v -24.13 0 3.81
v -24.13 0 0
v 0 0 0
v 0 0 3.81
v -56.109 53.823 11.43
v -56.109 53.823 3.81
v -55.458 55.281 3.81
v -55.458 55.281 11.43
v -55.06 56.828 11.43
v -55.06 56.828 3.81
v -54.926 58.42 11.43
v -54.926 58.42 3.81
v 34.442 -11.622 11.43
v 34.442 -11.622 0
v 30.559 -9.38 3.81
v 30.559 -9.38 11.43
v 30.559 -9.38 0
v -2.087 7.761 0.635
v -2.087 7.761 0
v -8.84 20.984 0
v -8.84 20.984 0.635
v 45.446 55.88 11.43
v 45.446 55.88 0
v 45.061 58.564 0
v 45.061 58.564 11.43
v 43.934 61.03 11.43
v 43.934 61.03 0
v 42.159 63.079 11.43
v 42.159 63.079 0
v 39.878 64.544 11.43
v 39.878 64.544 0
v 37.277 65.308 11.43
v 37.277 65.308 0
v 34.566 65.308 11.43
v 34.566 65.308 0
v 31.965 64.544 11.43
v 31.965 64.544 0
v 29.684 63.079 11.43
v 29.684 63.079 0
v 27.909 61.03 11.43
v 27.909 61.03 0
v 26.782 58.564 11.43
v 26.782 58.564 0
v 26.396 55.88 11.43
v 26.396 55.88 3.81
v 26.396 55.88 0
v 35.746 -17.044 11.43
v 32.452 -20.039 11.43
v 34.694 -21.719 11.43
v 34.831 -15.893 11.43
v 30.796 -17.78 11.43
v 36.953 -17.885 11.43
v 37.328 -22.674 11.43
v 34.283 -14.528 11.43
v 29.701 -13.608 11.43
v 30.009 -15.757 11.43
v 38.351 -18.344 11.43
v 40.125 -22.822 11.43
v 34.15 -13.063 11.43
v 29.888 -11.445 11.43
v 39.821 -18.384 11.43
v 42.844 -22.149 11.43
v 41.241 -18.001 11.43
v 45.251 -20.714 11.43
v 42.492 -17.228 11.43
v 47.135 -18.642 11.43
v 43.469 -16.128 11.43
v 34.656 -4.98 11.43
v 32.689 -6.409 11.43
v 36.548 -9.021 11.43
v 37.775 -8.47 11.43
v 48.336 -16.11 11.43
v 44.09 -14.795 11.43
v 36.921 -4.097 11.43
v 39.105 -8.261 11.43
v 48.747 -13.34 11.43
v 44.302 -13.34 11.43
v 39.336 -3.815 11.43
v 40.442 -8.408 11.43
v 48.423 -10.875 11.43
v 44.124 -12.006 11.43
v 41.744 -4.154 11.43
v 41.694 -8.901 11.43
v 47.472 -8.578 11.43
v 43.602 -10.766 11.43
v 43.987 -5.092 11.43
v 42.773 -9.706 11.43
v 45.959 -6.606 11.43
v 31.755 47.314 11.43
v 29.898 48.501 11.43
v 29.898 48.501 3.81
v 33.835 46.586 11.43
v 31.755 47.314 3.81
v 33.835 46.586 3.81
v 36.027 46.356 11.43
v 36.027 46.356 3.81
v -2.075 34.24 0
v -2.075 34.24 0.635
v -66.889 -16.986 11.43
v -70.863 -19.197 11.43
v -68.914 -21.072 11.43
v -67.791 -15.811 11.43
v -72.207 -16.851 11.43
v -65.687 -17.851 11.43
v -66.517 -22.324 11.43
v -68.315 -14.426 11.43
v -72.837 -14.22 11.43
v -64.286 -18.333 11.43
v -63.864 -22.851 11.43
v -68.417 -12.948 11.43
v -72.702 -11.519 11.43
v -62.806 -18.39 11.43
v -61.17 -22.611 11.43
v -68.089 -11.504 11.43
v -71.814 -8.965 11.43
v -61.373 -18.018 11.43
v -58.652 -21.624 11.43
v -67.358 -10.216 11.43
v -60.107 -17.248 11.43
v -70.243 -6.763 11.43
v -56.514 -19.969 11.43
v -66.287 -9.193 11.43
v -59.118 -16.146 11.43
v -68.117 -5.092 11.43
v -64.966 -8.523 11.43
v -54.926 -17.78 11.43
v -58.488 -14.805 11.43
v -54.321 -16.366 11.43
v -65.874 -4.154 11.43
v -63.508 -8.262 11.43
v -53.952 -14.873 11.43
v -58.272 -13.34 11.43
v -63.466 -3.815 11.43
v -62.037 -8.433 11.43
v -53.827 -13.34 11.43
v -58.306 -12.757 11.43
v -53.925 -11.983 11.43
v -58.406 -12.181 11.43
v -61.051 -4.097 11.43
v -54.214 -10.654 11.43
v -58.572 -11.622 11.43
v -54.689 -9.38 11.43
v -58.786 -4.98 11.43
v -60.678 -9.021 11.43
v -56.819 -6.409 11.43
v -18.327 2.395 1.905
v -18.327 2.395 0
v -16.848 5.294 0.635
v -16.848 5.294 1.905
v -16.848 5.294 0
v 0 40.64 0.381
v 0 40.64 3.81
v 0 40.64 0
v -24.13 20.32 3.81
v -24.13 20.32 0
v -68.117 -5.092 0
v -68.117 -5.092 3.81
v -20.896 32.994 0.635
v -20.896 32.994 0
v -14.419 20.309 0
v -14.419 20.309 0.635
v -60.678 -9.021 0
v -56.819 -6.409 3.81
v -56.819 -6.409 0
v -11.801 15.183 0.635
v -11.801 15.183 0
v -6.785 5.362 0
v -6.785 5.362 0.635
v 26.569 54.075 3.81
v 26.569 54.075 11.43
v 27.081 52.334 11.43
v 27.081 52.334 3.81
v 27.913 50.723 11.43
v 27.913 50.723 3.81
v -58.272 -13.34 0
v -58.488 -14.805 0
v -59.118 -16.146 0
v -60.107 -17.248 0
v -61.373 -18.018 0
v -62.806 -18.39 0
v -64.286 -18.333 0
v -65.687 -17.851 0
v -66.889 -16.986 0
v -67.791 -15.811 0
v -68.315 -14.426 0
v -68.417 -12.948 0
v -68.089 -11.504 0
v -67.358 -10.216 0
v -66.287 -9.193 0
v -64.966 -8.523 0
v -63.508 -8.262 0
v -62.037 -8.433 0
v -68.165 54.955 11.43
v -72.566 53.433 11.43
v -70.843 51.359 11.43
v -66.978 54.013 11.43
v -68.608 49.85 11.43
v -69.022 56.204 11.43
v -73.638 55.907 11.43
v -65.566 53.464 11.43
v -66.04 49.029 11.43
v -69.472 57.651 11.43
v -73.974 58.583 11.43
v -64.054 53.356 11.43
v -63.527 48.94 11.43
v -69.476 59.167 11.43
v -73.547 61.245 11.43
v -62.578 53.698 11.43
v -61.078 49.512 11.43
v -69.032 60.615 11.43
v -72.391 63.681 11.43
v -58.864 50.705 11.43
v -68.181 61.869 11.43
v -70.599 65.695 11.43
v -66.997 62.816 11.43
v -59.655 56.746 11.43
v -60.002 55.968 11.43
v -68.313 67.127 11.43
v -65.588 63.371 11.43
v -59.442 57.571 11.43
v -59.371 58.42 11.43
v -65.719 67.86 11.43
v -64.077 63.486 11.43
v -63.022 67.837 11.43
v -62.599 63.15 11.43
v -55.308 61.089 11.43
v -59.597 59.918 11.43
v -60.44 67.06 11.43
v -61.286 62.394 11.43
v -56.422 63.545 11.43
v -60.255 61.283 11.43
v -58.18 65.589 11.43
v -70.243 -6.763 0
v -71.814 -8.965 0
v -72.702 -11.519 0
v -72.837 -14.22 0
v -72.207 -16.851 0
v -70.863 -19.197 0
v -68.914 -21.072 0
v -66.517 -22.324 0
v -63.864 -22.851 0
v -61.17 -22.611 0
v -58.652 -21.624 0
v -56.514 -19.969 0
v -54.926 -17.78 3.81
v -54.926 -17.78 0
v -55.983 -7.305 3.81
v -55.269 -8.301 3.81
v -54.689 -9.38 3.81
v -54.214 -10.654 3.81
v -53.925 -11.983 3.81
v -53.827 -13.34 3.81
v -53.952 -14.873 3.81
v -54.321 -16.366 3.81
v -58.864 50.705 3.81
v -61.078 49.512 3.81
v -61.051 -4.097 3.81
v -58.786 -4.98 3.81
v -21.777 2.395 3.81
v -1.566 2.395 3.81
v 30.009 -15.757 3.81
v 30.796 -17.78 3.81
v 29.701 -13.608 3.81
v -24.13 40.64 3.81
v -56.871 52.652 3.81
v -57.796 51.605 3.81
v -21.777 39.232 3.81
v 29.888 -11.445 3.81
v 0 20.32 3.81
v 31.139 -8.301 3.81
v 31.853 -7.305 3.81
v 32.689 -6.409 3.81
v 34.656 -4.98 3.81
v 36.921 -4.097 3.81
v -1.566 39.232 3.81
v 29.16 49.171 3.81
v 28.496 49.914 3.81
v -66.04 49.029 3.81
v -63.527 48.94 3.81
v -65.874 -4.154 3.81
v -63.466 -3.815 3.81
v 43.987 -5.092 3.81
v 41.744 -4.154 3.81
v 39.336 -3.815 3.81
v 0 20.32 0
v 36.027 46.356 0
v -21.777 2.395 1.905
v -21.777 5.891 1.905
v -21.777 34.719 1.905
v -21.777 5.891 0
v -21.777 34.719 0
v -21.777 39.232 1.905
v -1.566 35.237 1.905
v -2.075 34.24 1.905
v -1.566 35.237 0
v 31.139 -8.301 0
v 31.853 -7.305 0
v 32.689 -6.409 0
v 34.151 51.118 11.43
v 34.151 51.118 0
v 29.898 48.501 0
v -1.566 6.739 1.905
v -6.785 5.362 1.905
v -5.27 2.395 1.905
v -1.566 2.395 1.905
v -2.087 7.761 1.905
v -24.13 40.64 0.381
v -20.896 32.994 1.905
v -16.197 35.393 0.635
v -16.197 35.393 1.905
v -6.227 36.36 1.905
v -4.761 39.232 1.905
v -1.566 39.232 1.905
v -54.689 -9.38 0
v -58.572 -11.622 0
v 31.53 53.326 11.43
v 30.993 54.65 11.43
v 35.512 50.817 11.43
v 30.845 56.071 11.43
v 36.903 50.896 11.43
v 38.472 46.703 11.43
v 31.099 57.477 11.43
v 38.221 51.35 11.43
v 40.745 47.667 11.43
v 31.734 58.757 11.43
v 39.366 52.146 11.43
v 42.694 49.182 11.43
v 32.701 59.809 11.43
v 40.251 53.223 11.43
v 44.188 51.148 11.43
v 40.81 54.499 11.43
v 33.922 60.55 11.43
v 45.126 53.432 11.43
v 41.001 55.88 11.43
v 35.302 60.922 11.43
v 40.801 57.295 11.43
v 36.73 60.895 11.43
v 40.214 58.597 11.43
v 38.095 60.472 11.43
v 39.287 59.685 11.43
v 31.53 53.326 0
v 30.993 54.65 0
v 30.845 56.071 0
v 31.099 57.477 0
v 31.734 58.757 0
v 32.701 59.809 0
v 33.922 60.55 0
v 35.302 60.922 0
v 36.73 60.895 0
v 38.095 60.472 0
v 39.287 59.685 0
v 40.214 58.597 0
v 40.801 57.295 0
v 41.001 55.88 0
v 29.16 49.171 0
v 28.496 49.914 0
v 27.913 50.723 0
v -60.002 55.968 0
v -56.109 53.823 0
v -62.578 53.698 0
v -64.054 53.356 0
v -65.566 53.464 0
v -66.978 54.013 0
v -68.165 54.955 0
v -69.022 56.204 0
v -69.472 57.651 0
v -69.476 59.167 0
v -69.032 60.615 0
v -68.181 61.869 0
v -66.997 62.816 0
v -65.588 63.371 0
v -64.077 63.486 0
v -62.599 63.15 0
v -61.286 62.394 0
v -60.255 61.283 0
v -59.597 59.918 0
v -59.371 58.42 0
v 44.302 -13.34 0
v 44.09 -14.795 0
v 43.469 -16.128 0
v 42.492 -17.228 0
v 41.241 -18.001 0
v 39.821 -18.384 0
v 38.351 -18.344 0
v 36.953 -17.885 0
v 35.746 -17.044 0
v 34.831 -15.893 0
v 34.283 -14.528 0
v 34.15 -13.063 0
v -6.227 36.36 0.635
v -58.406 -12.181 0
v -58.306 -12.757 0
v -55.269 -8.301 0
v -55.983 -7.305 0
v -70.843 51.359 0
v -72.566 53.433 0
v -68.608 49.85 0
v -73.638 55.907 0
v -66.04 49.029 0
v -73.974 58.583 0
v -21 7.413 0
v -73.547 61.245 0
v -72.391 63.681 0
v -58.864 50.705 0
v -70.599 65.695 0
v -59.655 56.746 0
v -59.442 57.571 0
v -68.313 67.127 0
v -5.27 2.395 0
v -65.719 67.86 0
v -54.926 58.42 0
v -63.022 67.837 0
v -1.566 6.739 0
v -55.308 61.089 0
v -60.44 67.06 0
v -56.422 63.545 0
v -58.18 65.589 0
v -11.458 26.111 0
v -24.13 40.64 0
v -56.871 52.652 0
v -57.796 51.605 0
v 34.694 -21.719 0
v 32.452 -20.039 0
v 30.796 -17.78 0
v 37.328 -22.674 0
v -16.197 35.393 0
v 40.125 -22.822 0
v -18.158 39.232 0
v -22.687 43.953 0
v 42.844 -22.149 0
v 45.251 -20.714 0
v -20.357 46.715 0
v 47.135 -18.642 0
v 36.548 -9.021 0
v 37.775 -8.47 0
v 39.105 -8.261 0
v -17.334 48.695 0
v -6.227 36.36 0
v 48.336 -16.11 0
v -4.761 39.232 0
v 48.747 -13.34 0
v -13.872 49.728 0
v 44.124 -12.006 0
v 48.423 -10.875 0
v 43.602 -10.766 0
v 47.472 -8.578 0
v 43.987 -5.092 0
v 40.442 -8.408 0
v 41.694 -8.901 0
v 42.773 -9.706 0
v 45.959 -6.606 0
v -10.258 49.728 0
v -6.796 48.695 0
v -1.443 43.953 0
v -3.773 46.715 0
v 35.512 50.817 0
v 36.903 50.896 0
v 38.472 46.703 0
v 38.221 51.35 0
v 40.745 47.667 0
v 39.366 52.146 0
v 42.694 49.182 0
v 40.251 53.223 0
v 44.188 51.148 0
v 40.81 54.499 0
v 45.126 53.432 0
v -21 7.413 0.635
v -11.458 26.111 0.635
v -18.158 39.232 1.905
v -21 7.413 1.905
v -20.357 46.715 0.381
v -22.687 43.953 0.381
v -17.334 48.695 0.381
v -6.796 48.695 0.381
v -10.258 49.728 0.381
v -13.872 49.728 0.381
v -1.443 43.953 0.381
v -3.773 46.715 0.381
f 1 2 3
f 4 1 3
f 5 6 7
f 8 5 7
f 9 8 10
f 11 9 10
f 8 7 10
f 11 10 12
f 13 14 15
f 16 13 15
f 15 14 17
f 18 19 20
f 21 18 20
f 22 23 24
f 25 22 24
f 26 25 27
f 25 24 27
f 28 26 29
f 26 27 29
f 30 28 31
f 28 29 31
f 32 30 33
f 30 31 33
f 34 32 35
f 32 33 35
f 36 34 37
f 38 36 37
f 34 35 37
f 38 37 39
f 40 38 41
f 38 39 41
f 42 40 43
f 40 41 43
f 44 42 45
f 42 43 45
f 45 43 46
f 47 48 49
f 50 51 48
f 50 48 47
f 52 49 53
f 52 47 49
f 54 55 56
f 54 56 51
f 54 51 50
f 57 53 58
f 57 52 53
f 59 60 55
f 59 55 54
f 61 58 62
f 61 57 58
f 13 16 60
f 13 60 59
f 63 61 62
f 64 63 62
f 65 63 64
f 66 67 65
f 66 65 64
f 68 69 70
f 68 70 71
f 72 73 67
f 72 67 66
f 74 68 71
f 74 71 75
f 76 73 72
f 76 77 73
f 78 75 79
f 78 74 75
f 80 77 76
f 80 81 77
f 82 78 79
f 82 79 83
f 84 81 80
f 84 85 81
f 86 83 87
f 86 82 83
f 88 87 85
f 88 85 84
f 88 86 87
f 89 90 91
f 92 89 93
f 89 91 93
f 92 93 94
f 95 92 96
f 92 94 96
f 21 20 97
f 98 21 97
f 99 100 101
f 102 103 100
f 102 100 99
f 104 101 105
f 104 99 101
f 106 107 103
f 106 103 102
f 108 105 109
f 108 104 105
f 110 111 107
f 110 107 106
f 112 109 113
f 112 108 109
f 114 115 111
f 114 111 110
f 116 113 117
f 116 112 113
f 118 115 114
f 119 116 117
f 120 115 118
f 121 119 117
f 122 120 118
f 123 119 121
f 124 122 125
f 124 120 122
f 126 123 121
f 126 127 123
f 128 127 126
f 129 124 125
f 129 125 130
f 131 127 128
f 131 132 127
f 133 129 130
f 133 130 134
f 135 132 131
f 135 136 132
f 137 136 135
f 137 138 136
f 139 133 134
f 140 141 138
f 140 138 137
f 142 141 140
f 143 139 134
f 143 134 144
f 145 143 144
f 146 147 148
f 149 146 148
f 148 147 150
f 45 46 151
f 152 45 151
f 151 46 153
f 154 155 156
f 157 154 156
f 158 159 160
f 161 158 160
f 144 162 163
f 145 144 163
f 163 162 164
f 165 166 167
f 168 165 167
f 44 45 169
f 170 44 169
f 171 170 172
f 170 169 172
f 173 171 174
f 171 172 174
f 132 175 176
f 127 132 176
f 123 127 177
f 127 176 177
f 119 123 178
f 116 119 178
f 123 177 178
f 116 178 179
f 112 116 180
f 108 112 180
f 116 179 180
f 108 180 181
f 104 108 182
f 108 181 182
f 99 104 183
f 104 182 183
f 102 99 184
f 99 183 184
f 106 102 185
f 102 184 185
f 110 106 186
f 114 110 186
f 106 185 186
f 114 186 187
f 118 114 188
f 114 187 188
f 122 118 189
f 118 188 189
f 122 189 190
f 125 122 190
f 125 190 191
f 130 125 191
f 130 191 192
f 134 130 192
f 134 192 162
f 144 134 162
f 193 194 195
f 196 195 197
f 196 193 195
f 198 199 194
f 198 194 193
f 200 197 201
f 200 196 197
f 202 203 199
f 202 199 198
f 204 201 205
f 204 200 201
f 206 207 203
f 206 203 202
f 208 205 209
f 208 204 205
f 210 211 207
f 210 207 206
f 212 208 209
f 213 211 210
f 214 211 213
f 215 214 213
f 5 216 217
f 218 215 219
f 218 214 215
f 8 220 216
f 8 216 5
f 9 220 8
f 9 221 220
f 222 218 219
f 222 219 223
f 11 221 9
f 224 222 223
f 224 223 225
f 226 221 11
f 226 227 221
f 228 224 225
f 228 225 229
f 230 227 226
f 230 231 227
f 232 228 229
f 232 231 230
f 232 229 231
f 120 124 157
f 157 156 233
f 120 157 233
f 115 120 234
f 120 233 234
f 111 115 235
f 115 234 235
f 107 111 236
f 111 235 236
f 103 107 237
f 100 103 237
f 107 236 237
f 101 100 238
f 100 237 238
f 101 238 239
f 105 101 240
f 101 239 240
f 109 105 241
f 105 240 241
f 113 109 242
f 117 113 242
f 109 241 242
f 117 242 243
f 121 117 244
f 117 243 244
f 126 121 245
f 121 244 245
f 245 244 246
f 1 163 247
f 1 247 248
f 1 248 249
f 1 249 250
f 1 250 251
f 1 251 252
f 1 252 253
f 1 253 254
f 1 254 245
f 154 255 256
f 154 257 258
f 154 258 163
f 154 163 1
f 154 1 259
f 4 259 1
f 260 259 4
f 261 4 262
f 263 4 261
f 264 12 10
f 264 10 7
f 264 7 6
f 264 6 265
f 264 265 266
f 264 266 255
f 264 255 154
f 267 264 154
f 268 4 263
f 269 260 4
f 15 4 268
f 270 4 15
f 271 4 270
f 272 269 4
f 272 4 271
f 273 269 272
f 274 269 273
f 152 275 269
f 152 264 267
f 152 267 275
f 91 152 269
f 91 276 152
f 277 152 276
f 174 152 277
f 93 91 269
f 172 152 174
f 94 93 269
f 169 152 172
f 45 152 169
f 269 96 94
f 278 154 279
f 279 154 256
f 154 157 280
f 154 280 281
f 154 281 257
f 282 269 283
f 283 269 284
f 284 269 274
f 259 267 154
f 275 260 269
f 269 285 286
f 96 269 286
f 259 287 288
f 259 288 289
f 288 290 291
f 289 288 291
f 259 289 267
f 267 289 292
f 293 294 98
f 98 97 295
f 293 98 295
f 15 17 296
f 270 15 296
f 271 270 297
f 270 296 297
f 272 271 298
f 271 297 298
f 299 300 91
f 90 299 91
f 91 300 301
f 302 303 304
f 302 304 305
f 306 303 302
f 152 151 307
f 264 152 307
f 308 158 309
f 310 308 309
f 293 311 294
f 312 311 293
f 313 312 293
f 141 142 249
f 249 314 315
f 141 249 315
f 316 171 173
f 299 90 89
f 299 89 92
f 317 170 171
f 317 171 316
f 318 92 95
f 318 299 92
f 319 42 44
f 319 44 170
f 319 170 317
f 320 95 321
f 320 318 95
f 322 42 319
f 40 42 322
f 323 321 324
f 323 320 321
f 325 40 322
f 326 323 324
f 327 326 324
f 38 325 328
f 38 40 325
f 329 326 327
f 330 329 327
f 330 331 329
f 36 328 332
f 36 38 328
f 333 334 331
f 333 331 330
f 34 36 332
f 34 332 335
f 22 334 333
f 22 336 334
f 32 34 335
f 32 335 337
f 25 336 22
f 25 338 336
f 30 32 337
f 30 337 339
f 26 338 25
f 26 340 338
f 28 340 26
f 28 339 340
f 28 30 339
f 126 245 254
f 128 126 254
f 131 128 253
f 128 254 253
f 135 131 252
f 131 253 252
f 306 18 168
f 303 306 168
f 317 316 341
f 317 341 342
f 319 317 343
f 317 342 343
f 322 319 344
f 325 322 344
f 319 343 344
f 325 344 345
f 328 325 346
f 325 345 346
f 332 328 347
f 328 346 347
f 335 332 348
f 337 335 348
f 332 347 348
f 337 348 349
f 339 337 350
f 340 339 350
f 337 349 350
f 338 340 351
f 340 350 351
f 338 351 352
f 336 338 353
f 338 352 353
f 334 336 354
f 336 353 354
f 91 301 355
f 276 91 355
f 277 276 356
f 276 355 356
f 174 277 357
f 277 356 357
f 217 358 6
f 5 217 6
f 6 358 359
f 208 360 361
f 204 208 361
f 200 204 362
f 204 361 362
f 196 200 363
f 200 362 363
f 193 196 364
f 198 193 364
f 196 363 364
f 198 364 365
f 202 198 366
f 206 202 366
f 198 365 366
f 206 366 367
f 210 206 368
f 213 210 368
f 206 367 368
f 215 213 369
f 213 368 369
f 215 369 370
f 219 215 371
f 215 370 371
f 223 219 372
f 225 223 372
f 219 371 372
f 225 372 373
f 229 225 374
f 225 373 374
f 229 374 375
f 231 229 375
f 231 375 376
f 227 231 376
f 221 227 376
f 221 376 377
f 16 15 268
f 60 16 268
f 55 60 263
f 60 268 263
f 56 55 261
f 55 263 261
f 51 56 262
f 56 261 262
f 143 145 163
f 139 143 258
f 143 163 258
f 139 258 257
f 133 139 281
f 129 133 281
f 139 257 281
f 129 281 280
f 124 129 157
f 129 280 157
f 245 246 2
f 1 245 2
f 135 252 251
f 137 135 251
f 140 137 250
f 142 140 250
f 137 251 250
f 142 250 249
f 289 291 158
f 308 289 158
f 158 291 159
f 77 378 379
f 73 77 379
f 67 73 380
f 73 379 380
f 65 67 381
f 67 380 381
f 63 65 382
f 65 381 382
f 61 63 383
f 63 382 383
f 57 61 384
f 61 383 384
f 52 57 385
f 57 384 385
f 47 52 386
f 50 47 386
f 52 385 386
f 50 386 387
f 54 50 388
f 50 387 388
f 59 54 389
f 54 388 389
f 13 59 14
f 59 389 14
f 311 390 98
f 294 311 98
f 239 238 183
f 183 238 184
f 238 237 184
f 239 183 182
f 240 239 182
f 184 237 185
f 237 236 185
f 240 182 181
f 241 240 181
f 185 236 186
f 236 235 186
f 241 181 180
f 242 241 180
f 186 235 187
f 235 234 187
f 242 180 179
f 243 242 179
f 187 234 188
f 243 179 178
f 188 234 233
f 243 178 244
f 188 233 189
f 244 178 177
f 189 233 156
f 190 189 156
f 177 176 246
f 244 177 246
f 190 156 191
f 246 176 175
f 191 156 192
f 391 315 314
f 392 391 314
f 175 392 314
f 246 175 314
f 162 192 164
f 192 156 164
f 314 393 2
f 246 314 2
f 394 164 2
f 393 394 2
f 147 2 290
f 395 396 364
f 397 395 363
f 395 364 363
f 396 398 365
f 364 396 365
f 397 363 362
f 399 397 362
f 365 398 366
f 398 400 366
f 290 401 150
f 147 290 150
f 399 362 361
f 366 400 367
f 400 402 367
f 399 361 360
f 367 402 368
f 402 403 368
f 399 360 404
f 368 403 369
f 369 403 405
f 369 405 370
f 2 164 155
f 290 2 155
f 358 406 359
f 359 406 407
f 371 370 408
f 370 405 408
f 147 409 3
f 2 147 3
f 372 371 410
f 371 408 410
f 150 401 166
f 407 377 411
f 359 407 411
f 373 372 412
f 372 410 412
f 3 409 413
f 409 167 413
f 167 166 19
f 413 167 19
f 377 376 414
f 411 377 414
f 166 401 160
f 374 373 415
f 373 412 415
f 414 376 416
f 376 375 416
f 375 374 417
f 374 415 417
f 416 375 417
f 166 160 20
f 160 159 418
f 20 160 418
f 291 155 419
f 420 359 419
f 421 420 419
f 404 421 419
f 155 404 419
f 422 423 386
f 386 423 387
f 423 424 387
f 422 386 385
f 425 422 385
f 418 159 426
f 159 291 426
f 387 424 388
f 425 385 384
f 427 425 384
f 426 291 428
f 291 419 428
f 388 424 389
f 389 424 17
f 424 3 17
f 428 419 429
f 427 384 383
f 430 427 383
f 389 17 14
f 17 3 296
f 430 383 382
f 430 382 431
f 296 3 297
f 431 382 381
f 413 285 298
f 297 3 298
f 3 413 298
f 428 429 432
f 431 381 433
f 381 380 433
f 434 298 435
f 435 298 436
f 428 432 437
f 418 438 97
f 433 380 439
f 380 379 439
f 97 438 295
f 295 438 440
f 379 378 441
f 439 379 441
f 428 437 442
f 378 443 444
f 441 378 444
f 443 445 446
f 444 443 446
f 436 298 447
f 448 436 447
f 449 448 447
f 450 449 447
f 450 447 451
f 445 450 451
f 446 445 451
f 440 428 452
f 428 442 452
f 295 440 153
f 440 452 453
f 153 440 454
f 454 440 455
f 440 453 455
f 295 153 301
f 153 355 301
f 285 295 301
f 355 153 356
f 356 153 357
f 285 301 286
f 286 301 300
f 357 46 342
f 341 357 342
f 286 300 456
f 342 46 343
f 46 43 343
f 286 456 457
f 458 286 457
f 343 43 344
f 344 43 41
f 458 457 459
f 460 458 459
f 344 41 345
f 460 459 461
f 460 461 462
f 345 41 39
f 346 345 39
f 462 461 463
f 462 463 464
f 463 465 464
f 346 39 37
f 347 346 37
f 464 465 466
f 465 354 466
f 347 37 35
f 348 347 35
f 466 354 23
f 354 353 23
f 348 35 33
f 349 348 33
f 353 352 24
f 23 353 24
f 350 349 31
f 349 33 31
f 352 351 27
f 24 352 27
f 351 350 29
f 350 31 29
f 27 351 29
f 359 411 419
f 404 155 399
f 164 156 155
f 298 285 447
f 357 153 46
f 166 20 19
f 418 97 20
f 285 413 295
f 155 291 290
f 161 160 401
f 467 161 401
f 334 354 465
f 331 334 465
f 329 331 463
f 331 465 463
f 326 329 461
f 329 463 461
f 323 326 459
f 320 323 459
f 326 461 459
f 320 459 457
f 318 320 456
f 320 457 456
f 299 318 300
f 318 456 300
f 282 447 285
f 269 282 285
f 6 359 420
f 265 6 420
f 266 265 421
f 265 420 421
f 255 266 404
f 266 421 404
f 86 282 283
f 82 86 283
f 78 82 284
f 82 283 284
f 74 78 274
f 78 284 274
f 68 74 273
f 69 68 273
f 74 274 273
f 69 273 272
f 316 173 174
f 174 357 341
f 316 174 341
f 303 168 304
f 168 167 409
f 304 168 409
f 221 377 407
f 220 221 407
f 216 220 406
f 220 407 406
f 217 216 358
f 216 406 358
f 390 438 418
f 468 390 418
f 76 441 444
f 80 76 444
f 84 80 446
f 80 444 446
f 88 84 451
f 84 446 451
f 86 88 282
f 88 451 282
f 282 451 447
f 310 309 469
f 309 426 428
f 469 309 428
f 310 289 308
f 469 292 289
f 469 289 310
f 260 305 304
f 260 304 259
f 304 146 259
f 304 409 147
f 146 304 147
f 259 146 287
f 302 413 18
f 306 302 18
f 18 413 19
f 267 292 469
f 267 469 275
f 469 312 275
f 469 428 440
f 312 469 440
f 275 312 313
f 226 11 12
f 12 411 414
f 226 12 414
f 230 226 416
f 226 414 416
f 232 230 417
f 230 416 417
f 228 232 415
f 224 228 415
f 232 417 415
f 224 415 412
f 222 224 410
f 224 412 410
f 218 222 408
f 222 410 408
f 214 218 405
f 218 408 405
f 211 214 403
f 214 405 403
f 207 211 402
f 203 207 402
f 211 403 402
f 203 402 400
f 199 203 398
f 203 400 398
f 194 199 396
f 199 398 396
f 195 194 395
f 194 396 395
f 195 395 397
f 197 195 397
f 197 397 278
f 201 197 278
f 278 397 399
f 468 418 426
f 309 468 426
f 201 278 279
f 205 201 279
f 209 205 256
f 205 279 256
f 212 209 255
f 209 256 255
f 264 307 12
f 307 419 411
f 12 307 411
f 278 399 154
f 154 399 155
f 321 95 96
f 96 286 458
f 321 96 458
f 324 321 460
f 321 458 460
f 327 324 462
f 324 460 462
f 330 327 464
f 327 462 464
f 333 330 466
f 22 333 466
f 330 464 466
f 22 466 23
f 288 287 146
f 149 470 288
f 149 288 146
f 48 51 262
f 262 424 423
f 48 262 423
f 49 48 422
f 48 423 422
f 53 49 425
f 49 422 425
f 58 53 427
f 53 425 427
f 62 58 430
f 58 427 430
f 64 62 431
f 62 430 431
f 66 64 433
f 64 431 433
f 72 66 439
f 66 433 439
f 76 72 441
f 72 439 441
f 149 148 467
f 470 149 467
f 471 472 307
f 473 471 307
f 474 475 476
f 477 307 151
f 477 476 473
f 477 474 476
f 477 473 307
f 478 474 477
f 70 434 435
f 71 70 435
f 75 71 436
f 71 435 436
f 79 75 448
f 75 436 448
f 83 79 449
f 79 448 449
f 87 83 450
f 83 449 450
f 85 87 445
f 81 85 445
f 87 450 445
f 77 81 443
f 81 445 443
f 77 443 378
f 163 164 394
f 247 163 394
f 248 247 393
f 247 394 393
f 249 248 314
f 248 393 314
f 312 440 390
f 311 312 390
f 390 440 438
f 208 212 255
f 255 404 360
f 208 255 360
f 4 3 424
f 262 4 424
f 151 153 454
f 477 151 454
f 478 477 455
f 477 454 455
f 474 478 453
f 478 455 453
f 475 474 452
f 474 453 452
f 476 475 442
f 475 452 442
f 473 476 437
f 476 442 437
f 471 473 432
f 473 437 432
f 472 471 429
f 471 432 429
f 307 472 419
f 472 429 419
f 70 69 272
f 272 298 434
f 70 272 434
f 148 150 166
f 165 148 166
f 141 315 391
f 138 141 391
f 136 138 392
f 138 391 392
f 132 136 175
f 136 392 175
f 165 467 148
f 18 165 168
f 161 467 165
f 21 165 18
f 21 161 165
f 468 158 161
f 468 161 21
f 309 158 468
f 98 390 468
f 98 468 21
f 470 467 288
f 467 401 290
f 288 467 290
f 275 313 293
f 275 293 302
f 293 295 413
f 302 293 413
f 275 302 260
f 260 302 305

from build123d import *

# Parameters (mm, degrees)
F1_DEPTH = 3.81
F2_DEPTH = 11.43
F3_DEPTH = 1.905
F4_DEPTH = 0.635
F5_DEPTH = 0.381


with BuildPart() as f1:
    # F0 (on Top) → F1 (new body)
    with BuildSketch(Plane.XY):
        with BuildLine():
            Line((0, 40.64), (0, 20.32))
            Line((0, 20.32), (36.0270839263, 46.3555857197))
            ThreePointArc((36.0270839263, 46.3555857197), (32.7743226286, 46.8899395332), (29.8984857282, 48.5010112824))
            ThreePointArc((29.8984857282, 48.5010112824), (28.8184538619, 49.5338980727), (27.9132711745, 50.7230020447))
            ThreePointArc((27.9132711745, 50.7230020447), (26.7835232138, 53.1922797151), (26.3964543073, 55.88))
            Line((26.3964543073, 55.88), (0, 40.64))
        make_face()
        with BuildLine():
            Line((0, 20.32), (0, 0))
            Line((0, 0), (30.7958633586, -17.78))
            ThreePointArc((30.7958633586, -17.78), (29.7012441826, -13.6075167511), (30.5594271825, -9.3800672195))
            ThreePointArc((30.5594271825, -9.3800672195), (31.4801291394, -7.7913902048), (32.6885555919, -6.4088952646))
            ThreePointArc((32.6885555919, -6.4088952646), (38.1196995449, -3.8785721663), (43.9872077535, -5.0919175595))
            Line((43.9872077535, -5.0919175595), (0, 20.32))
        make_face()
        with BuildLine():
            Line((-54.9258633586, -17.78), (-24.13, 0))
            Line((-24.13, 0), (-24.13, 20.32))
            Line((-24.13, 20.32), (-68.1172077535, -5.0919175595))
            ThreePointArc((-68.1172077535, -5.0919175595), (-62.2496995449, -3.8785721663), (-56.8185555919, -6.4088952646))
            ThreePointArc((-56.8185555919, -6.4088952646), (-55.6101291394, -7.7913902048), (-54.6894271825, -9.3800672195))
            ThreePointArc((-54.6894271825, -9.3800672195), (-54.0454560084, -11.3134252867), (-53.8274732111, -13.3395190133))
            ThreePointArc((-53.8274732111, -13.3395190133), (-54.1061473504, -15.6266751246), (-54.9258633586, -17.78))
        make_face()
        with BuildLine():
            Line((-66.0401488201, 49.028525317), (-24.13, 20.32))
            Line((-24.13, 20.32), (-24.13, 40.64))
            Line((-24.13, 40.64), (-54.9258633586, 58.42))
            ThreePointArc((-54.9258633586, 58.42), (-55.2263237646, 56.0465016792), (-56.1087492964, 53.8227445173))
            ThreePointArc((-56.1087492964, 53.8227445173), (-57.3142816625, 52.1116859071), (-58.8644308605, 50.7052480957))
            ThreePointArc((-58.8644308605, 50.7052480957), (-62.2835733625, 49.1448461429), (-66.0401488201, 49.028525317))
        make_face()
        Polygon((-24.13, 0), (0, 0), (0, 20.32), (0, 40.64), (-24.13, 40.64), (-24.13, 20.32), align=None)
        Polygon((-18.3272082359, 2.3950056639), (-21.7771697789, 2.3950056639), (-21.7771697789, 5.8912090026), (-21.7771697789, 34.7188413143), (-21.7771697789, 39.2318554223), (-18.1576330215, 39.2318554223), (-4.7612613998, 39.2318554223), (-1.5657880576, 39.2318554223), (-1.5657880576, 35.2370127553), (-1.5657880576, 6.7390808836), (-1.5657880576, 2.3950056639), (-5.2699861117, 2.3950056639), align=None, mode=Mode.SUBTRACT)
    extrude(amount=F1_DEPTH)

    # F0 (on Top) → F2 (join)
    with BuildSketch(Plane.XY):
        with BuildLine():
            ThreePointArc((30.5594271825, -9.3800672195), (29.7012441826, -13.6075167511), (30.7958633586, -17.78))
            ThreePointArc((30.7958633586, -17.78), (41.5096293224, -22.585844874), (48.7474732111, -13.3395190133))
            ThreePointArc((48.7474732111, -13.3395190133), (47.4720102137, -8.5781364156), (43.9872077535, -5.0919175595))
            ThreePointArc((43.9872077535, -5.0919175595), (38.1196995449, -3.8785721663), (32.6885555919, -6.4088952646))
            Line((32.6885555919, -6.4088952646), (36.5475066082, -9.0208440228))
            ThreePointArc((36.5475066082, -9.0208440228), (41.6940688149, -8.9013194717), (44.3024732111, -13.3395190133))
            ThreePointArc((44.3024732111, -13.3395190133), (38.3505482132, -18.3441315655), (34.4417854953, -11.6215478365))
            Line((34.4417854953, -11.6215478365), (30.5594271825, -9.3800672195))
        make_face()
        with BuildLine():
            ThreePointArc((-68.1172077535, -5.0919175595), (-69.9554416118, -20.2043885167), (-54.9258633586, -17.78))
            ThreePointArc((-54.9258633586, -17.78), (-54.1061473504, -15.6266751246), (-53.8274732111, -13.3395190133))
            ThreePointArc((-53.8274732111, -13.3395190133), (-54.0454560084, -11.3134252867), (-54.6894271825, -9.3800672195))
            Line((-54.6894271825, -9.3800672195), (-58.5717854953, -11.6215478365))
            ThreePointArc((-58.5717854953, -11.6215478365), (-58.3478606589, -12.4675940154), (-58.2724732111, -13.3395190133))
            ThreePointArc((-58.2724732111, -13.3395190133), (-67.7906727527, -15.8111146171), (-60.6775066082, -9.0208440228))
            Line((-60.6775066082, -9.0208440228), (-56.8185555919, -6.4088952646))
            ThreePointArc((-56.8185555919, -6.4088952646), (-62.2496995449, -3.8785721663), (-68.1172077535, -5.0919175595))
        make_face()
        with BuildLine():
            ThreePointArc((-54.9258633586, 58.42), (-70.5985328755, 65.6954233217), (-66.0401488201, 49.028525317))
            ThreePointArc((-66.0401488201, 49.028525317), (-62.2835733625, 49.1448461429), (-58.8644308605, 50.7052480957))
            Line((-58.8644308605, 50.7052480957), (-62.5780124602, 53.6978363526))
            ThreePointArc((-62.5780124602, 53.6978363526), (-68.6532723441, 61.2741476343), (-59.3708633586, 58.42))
            ThreePointArc((-59.3708633586, 58.42), (-59.5311595199, 57.153937545), (-60.0019319176, 55.9677746772))
            Line((-60.0019319176, 55.9677746772), (-56.1087492964, 53.8227445173))
            ThreePointArc((-56.1087492964, 53.8227445173), (-55.2263237646, 56.0465016792), (-54.9258633586, 58.42))
        make_face()
        with BuildLine():
            ThreePointArc((29.8984857282, 48.5010112824), (32.7743226286, 46.8899395332), (36.0270839263, 46.3555857197))
            ThreePointArc((36.0270839263, 46.3555857197), (42.6938891398, 49.1822577357), (45.4464543073, 55.88))
            ThreePointArc((45.4464543073, 55.88), (35.9214543073, 65.405), (26.3964543073, 55.88))
            ThreePointArc((26.3964543073, 55.88), (26.7835232138, 53.1922797151), (27.9132711745, 50.7230020447))
            Line((27.9132711745, 50.7230020447), (31.5300523665, 53.3261814877))
            ThreePointArc((31.5300523665, 53.3261814877), (34.598941899, 60.7848303671), (41.0014543073, 55.88))
            ThreePointArc((41.0014543073, 55.88), (38.820808345, 51.708651757), (34.1510030615, 51.1184978855))
            Line((34.1510030615, 51.1184978855), (29.8984857282, 48.5010112824))
        make_face()
    extrude(amount=F2_DEPTH)

    # F0 (on Top) → F3 (join)
    with BuildSketch(Plane.XY):
        Polygon((-21.7771697789, 5.8912090026), (-21.7771697789, 2.3950056639), (-18.3272082359, 2.3950056639), (-16.8476979102, 5.2939299848), (-21.0003481494, 7.4132984911), align=None)
        Polygon((-6.7851137214, 5.3618797736), (-5.2699861117, 2.3950056639), (-1.5657880576, 2.3950056639), (-1.5657880576, 6.7390808836), (-2.0874397167, 7.760661653), align=None)
        Polygon((-21.7771697789, 39.2318554223), (-21.7771697789, 34.7188413143), (-20.8961134896, 32.993585252), (-16.1974461672, 35.3931075525), (-18.1576330215, 39.2318554223), align=None)
        Polygon((-2.074527, 34.2401993722), (-1.5657880576, 35.2370127553), (-1.5657880576, 39.2318554223), (-4.7612613998, 39.2318554223), (-6.2271772392, 36.3595678785), align=None)
    extrude(amount=F3_DEPTH)

    # F0 (on Top) → F4 (join)
    with BuildSketch(Plane.XY):
        Polygon((-21.0003481494, 7.4132984911), (-16.8476979102, 5.2939299848), (-11.8006188508, 15.1830804564), (-6.7851137214, 5.3618797736), (-2.0874397167, 7.760661653), (-8.8398640982, 20.9843268631), (-2.074527, 34.2401993722), (-6.2271772392, 36.3595678785), (-11.4576985252, 26.110984206), (-16.1974461672, 35.3931075525), (-20.8961134896, 32.993585252), (-14.41858046, 20.309488601), align=None)
    extrude(amount=F4_DEPTH)

    # F0 (on Top) → F5 (join)
    with BuildSketch(Plane.XY):
        with BuildLine():
            Line((-24.13, 40.64), (0, 40.64))
            ThreePointArc((0, 40.64), (-12.065, 49.8591743067), (-24.13, 40.64))
        make_face()
    extrude(amount=F5_DEPTH)


solid = f1.part
